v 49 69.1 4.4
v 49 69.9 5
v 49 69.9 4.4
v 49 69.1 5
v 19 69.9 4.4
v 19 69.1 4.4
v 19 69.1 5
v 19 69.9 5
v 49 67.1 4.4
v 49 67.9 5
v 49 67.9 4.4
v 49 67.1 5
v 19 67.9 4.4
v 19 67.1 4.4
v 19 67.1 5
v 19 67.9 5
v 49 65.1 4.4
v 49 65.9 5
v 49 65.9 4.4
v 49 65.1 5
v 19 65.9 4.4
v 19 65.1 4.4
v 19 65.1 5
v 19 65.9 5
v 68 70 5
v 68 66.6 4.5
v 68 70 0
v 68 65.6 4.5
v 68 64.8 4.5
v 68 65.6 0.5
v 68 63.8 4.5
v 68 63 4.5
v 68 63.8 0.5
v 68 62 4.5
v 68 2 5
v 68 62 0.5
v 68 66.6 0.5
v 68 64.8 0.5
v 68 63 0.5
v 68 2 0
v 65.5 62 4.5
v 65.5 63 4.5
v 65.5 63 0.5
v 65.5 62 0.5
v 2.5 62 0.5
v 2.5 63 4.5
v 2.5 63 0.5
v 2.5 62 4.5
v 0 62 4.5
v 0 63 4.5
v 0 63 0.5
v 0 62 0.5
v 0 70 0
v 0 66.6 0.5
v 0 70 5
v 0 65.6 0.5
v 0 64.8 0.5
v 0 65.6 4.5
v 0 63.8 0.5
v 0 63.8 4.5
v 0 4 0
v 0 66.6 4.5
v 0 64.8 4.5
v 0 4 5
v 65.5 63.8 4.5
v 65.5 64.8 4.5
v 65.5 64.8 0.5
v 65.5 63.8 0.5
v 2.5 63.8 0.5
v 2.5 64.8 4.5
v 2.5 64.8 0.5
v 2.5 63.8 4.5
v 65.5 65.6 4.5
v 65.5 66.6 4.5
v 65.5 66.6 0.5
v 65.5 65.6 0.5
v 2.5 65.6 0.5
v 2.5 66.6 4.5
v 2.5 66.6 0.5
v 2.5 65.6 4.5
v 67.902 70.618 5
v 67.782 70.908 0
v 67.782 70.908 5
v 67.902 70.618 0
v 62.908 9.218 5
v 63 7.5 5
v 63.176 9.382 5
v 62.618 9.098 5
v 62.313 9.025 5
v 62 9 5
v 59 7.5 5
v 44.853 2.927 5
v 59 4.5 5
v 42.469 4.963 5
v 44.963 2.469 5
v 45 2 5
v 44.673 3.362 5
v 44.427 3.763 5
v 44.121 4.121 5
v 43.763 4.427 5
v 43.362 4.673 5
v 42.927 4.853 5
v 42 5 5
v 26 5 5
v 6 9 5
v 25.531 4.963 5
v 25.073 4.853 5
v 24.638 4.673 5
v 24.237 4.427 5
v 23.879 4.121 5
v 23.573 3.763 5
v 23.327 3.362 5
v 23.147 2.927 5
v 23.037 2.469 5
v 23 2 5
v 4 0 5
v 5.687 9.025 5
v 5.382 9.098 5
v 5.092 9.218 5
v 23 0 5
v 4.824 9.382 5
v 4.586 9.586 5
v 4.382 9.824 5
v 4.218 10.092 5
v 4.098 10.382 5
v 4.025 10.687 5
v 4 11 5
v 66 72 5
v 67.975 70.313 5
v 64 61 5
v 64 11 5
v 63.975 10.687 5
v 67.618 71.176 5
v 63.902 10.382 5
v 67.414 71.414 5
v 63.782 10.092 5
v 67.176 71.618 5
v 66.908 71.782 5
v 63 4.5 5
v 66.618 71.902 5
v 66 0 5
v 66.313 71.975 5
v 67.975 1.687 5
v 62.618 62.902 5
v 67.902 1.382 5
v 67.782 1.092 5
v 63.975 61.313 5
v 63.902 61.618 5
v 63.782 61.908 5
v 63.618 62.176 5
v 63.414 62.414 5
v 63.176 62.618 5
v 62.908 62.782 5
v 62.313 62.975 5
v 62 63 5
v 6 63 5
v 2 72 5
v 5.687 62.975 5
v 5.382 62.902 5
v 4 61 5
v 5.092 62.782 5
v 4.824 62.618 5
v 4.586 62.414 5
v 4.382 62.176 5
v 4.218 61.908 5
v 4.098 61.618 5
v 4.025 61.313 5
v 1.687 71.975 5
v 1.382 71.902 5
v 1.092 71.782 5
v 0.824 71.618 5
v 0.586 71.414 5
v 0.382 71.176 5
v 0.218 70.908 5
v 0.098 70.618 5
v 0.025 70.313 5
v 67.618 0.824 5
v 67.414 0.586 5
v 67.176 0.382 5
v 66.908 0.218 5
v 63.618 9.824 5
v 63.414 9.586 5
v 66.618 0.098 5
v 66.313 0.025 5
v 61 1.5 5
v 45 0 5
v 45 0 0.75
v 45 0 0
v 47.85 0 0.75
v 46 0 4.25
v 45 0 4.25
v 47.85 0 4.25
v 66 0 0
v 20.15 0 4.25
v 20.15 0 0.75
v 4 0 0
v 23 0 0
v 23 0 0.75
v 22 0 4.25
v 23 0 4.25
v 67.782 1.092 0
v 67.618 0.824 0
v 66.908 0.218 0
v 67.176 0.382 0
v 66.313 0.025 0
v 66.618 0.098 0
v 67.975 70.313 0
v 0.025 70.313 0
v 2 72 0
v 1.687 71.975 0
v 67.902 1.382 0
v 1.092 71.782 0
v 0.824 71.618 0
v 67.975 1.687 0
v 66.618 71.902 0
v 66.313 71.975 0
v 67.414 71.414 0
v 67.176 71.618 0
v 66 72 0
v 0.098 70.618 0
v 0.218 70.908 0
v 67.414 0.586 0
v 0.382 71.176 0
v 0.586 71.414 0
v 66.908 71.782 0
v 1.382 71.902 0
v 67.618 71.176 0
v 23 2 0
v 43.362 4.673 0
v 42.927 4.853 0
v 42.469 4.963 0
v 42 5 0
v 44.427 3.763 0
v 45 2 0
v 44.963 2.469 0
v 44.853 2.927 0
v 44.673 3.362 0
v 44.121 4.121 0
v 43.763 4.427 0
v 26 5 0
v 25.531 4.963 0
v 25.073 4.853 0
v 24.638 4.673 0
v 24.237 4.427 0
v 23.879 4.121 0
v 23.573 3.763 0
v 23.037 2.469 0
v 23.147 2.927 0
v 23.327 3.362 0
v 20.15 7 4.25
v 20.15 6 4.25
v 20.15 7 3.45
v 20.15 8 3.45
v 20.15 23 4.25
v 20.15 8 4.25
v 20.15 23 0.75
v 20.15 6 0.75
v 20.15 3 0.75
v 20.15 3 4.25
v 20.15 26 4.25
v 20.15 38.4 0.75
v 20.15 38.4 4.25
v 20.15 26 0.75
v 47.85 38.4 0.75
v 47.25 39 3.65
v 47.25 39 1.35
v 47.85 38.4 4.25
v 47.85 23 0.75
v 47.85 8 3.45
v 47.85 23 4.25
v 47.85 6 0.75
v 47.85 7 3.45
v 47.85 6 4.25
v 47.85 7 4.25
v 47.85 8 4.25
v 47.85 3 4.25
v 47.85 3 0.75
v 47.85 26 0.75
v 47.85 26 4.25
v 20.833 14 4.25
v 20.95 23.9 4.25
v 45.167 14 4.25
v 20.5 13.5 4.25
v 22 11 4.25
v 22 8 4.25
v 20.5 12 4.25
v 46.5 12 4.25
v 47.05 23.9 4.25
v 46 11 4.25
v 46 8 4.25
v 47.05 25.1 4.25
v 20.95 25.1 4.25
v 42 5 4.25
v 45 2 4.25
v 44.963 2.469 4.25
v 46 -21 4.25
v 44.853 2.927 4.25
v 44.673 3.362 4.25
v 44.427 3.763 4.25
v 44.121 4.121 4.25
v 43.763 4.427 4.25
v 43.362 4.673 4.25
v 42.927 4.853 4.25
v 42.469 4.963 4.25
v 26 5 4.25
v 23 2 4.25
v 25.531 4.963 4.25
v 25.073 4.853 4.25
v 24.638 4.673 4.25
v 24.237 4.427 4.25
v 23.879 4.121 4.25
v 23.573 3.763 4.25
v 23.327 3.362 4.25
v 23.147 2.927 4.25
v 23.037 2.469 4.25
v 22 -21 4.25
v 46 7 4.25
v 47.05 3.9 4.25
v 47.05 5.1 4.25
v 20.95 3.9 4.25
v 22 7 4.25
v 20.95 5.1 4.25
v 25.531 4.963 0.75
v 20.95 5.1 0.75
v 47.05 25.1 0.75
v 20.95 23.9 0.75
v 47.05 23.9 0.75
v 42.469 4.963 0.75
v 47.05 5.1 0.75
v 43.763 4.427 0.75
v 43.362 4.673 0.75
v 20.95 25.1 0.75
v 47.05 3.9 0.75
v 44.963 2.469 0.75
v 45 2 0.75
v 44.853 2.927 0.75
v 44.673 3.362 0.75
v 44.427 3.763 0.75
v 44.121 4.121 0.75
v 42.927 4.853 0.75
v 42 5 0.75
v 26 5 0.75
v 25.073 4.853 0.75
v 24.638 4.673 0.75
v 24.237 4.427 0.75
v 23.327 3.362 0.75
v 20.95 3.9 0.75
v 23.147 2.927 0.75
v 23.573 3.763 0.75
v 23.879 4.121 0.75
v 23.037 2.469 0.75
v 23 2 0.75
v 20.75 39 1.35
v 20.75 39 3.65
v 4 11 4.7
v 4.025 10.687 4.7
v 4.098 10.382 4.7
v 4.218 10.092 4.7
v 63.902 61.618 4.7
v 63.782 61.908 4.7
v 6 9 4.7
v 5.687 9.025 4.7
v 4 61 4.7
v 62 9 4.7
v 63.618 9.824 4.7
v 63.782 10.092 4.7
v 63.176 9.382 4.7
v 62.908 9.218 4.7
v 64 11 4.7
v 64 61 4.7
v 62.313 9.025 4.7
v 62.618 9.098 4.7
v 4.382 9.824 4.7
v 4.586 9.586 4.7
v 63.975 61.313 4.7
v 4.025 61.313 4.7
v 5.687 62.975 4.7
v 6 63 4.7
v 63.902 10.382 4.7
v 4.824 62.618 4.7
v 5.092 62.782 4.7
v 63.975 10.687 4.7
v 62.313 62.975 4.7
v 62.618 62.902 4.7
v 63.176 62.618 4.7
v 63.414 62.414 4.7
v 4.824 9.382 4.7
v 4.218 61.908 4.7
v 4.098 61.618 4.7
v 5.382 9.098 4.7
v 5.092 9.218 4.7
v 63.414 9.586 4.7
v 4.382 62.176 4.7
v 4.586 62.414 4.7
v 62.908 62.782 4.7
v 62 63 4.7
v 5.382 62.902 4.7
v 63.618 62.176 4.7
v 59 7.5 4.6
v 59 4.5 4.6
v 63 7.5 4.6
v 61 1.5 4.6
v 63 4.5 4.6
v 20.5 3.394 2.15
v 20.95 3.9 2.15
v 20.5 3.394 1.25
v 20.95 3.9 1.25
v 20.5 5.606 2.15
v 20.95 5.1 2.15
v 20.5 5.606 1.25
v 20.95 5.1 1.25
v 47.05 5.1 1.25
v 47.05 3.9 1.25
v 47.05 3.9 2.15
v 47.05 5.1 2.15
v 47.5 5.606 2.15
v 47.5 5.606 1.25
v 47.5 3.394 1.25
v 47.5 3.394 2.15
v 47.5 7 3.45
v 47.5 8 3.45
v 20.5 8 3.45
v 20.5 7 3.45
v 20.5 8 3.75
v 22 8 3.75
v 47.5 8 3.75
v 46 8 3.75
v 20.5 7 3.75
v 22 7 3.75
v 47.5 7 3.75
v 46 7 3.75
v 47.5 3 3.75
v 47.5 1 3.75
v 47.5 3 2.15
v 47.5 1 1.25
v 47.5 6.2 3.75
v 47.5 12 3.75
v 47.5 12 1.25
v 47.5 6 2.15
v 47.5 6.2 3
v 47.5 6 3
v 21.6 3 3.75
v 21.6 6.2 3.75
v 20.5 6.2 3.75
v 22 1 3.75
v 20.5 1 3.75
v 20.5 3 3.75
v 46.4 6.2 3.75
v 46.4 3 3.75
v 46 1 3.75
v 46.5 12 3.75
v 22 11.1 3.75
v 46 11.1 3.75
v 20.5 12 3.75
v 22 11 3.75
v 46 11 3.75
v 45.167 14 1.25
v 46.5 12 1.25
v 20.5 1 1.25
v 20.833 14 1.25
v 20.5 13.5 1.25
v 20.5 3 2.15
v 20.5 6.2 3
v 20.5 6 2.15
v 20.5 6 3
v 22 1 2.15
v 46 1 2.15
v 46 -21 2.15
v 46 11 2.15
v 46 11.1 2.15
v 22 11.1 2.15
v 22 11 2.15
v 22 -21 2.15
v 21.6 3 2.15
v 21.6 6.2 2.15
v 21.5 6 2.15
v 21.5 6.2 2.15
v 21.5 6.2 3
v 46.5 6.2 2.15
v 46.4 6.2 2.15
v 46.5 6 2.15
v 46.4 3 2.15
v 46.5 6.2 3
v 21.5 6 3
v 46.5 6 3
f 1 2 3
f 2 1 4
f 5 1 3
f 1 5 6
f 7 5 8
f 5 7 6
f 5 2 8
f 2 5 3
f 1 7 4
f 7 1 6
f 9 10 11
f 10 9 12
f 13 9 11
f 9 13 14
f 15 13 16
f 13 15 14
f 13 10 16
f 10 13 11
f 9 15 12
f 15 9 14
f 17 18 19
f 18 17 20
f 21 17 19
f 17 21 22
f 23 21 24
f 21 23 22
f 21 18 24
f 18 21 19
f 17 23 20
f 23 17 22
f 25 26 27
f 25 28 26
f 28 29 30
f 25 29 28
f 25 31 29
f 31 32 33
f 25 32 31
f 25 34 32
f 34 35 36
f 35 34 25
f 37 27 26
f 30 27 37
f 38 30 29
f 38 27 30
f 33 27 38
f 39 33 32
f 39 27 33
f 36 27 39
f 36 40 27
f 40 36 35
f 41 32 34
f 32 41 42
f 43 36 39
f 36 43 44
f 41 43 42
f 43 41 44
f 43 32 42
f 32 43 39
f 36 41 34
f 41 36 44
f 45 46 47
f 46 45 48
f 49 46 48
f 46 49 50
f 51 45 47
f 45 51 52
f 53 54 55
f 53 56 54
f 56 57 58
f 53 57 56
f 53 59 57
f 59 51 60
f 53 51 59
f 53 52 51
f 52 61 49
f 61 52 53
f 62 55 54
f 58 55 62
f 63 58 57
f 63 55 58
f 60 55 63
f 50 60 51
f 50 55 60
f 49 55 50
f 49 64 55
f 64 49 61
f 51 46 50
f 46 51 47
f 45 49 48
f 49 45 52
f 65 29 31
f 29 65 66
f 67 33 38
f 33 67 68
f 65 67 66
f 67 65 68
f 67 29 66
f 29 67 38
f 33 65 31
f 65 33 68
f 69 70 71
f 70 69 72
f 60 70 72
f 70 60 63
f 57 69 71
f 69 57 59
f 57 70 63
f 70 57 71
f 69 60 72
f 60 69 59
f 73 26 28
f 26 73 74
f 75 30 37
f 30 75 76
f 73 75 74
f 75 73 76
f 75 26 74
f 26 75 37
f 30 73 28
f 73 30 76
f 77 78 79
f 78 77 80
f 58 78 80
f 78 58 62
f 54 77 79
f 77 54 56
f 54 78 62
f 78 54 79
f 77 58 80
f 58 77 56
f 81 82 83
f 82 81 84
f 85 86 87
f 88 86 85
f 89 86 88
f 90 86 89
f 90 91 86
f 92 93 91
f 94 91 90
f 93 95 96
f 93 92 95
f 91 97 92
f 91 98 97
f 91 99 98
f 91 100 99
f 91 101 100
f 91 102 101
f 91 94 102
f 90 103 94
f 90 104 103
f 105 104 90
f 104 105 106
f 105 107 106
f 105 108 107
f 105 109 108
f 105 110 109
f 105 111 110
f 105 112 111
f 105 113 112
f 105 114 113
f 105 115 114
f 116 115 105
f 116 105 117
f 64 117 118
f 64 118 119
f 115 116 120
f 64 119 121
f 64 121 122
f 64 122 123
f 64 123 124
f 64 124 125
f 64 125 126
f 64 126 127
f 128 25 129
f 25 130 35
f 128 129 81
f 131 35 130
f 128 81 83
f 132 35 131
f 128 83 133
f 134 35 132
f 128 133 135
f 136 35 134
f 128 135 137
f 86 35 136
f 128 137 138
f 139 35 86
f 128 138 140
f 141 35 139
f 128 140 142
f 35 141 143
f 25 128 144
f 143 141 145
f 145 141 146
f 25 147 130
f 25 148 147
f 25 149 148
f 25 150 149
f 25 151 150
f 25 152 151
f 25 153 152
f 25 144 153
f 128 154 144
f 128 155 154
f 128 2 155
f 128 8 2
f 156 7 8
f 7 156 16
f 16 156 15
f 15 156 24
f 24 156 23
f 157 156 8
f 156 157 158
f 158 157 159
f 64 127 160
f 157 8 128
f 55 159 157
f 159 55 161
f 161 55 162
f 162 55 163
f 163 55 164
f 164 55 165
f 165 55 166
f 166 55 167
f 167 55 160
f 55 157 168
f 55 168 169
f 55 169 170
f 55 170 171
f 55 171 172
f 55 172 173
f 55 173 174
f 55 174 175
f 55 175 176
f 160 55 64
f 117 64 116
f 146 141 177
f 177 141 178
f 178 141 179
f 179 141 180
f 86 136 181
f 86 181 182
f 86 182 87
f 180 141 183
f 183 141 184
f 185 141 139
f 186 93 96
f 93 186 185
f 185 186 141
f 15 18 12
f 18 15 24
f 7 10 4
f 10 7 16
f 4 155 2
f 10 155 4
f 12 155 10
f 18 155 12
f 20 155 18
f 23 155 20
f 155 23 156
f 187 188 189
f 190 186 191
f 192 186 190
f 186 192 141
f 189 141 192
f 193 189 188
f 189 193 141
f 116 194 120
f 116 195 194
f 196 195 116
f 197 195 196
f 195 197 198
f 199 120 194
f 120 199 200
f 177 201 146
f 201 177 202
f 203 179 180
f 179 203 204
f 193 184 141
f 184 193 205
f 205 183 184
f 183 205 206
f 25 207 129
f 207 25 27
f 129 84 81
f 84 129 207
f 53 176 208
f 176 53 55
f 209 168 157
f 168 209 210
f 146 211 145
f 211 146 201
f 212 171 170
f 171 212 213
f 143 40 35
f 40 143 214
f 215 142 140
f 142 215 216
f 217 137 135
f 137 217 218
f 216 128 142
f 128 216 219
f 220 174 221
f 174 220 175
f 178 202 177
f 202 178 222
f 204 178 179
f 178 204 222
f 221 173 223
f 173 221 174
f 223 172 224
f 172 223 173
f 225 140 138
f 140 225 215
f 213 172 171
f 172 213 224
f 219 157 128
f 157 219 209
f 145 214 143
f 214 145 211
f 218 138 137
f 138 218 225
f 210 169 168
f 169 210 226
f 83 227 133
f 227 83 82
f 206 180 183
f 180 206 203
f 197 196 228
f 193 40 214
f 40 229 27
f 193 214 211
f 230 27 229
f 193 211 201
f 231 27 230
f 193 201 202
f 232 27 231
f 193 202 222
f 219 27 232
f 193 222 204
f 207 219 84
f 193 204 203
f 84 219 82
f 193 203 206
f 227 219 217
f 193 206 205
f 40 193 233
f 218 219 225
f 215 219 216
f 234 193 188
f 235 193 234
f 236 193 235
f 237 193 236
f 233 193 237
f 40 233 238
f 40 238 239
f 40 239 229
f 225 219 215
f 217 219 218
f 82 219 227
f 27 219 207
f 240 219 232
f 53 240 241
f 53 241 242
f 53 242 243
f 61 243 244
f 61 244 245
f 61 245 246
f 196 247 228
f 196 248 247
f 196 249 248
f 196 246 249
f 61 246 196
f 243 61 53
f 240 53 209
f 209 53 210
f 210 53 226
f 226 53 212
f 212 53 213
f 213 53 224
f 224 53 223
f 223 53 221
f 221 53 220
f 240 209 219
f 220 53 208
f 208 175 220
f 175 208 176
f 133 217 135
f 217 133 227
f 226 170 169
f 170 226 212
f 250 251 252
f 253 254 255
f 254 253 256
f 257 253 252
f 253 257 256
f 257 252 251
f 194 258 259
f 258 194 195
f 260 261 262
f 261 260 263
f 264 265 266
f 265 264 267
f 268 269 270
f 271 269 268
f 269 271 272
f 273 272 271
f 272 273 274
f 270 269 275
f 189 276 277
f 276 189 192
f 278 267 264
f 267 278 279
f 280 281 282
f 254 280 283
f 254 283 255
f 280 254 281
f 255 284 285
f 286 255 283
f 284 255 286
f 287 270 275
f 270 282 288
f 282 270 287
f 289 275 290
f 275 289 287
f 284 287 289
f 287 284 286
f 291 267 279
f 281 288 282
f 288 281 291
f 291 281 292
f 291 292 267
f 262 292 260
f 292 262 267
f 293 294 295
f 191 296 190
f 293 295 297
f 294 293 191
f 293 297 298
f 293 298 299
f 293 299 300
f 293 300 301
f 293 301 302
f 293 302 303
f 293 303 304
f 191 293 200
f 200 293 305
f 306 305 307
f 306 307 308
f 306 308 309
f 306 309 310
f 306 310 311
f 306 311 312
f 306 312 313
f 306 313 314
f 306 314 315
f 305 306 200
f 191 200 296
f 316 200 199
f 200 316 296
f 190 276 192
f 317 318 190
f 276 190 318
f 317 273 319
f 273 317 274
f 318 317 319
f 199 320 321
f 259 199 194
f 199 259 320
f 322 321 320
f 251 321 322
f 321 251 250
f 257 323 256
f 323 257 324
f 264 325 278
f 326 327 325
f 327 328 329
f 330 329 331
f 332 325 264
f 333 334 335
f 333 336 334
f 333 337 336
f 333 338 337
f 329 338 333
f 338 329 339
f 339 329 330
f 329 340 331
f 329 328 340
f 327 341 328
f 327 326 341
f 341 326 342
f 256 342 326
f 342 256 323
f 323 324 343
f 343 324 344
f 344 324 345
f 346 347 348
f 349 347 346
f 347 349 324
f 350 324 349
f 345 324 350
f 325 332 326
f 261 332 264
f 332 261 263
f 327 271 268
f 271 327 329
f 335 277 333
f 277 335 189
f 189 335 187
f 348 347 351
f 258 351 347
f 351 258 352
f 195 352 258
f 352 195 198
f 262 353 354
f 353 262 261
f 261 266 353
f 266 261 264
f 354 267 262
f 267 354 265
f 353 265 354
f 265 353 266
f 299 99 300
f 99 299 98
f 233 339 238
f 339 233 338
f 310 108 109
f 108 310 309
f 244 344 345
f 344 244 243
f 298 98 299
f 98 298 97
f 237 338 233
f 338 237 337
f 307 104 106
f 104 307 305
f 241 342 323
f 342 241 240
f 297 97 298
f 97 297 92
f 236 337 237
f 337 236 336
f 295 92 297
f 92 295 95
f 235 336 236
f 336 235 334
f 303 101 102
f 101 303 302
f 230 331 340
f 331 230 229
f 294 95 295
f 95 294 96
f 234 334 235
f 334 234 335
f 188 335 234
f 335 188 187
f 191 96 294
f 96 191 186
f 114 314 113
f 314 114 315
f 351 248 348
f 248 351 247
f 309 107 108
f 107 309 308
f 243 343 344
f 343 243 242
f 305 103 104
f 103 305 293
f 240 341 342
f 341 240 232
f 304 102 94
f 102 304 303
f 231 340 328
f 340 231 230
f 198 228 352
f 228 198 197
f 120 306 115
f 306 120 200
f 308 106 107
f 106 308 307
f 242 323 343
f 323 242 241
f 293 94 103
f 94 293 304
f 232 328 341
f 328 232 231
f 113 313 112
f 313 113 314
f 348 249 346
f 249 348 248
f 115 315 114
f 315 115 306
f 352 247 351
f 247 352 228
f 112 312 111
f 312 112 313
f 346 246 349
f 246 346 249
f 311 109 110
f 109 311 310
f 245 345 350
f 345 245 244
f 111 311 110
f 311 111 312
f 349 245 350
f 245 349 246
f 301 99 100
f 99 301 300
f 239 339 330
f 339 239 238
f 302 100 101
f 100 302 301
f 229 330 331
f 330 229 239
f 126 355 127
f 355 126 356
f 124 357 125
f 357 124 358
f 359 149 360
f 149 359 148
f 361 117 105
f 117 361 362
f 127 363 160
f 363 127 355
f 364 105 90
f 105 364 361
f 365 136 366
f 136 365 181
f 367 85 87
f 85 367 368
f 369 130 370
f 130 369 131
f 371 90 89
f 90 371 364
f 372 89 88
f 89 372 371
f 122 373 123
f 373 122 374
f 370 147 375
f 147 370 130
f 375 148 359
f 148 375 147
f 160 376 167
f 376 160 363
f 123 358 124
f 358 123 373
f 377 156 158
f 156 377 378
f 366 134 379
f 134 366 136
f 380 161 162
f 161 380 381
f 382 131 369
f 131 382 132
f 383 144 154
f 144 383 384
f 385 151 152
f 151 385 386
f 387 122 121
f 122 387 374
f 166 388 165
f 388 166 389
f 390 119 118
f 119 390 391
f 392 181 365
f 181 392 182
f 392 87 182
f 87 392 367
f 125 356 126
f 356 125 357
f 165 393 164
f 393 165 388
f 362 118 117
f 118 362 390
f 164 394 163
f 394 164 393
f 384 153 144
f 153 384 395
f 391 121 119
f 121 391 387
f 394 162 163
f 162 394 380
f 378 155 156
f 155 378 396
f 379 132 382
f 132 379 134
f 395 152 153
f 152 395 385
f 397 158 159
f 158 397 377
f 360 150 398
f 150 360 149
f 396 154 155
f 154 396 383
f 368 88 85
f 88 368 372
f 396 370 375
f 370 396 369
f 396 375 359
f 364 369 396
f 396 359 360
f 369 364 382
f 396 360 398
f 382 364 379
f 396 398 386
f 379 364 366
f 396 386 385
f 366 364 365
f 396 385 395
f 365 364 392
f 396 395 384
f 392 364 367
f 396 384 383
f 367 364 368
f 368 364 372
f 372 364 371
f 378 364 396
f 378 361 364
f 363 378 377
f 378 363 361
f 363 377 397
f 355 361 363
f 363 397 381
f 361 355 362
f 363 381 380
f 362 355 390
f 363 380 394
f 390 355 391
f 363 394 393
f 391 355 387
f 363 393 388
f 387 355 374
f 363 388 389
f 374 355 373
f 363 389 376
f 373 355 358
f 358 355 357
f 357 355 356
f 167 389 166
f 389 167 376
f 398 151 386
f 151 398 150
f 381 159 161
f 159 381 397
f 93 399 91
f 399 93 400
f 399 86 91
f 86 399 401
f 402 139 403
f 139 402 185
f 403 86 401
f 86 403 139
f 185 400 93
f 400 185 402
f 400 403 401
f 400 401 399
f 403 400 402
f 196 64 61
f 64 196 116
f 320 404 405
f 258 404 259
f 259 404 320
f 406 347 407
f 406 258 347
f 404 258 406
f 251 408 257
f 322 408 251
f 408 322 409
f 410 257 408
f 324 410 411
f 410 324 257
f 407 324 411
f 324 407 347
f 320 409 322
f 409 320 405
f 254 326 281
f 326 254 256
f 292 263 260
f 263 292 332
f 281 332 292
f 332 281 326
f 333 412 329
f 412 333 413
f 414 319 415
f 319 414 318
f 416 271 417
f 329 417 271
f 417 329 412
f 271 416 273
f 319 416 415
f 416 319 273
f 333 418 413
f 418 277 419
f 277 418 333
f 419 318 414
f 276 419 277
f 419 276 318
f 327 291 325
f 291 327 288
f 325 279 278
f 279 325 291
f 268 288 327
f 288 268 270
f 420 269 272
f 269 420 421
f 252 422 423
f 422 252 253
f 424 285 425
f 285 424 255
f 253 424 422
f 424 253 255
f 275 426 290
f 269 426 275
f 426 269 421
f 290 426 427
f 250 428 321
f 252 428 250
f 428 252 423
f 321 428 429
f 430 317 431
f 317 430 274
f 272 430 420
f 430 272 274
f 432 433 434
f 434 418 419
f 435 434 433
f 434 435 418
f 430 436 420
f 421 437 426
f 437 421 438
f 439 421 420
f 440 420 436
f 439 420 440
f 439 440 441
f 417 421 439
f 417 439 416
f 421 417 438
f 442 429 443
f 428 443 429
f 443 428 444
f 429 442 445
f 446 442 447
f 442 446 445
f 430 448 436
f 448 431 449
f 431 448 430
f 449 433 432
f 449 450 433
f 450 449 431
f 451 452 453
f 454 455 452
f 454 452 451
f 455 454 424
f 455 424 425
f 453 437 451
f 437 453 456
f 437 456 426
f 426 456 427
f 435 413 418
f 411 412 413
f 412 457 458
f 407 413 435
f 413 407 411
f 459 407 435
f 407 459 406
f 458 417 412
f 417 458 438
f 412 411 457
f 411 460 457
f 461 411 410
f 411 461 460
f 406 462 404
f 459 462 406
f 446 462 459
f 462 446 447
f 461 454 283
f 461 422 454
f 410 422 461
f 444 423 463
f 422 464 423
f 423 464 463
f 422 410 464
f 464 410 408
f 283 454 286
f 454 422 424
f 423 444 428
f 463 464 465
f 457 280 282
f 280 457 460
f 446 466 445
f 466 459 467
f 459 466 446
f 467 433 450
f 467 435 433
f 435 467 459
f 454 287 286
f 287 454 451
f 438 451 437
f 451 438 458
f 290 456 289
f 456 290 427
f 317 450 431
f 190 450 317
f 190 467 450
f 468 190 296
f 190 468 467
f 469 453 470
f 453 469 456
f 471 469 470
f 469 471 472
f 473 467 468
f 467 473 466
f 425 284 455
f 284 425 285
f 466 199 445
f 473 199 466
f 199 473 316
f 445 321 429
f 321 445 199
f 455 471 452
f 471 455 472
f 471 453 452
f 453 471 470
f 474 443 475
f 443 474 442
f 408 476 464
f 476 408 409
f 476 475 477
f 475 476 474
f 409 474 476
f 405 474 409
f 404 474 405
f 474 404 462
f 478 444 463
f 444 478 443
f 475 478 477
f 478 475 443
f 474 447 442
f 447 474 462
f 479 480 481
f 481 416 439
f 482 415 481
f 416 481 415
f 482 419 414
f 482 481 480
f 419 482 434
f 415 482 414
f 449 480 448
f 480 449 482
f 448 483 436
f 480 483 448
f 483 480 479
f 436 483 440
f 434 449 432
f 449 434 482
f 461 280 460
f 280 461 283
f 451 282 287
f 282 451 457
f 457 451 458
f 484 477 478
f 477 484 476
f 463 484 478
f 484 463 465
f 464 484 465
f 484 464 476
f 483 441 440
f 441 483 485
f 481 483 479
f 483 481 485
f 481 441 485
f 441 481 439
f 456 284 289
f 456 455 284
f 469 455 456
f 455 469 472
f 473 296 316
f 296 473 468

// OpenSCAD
// OMD-C MiniDisc-style SD shell
// 1-piece outer shell, cantilevered captive slider

// Overall body dimensions
body_w          = 68;
body_h          = 72;
body_t          = 5;

// Corner radii
corner_r_outer = 2;
corner_r_inner = 2;

// Label recess
label_margin_x = 4;
label_margin_y = 9;
label_d        = 0.3;

// Top grips
grip_w       = 30;
grip_h       = 0.8;
grip_d       = 0.6;
grip_spacing = 1.2;
grip_count   = 3;

_grip_total_h = grip_count*grip_h + (grip_count-1)*grip_spacing;
_grip_top_margin = (label_margin_y - _grip_total_h) / 2;
grip_offset_y = _grip_top_margin + grip_h;

// Prusa Mini Mode (adds bridging slack and slight expansion)
prusa_mini_mode = true; 

// Clearances
slot_height_base = 3.3; // vertical clearance for slider + SD card (SD is ~2.1)
bridge_sag_allowance = prusa_mini_mode ? 0.2 : 0;
slot_height = slot_height_base + bridge_sag_allowance;

slot_clearance_base = 0.3; // horizontal clearance each side
slot_clearance = slot_clearance_base + (prusa_mini_mode ? 0.05 : 0);

// SD Card dimensions
sd_w = 24.0;
sd_l = 32.0;

// Slider dimensions
slider_grip_l = 10.0; // How much of the SD card is gripped by the slider pocket
slider_w = sd_w + 3.0; // 1.5mm walls on each side
slider_h = 13.0; // Total length of slider block (very compact)
slider_t = 2.5; // Thickness of the base of the slider
pocket_d = 1.6; // depth of the pocket in the slider for the SD card

// Cavity dimensions (Internal space in the shell)
cav_w = slider_w + 2*slot_clearance;
cav_t = slot_height;
cavity_x = (body_w - cav_w)/2;

// The cavity needs to be long enough to house the slider + the remaining length of the SD card when retracted.
// When retracted, the front of the slider is at y = 24, tip of SD card at y = 2.
cav_h = 42; 

// Latch / Locking mechanism
latch_depth_x = 0.8;
latch_height_z = slot_height;
latch_len_y = 3.0;

latch_1_y = 3.0;  // Position of latch that locks extended state
latch_2_y = 23.0; // Position of latch that locks retracted state

notch_depth_x = latch_depth_x + 0.3;
notch_height_z = 1.6;
notch_len_y = 3.2;

// Notch position on the slider (only one pair of notches needed now!)
notch_from_front = 2.0;


// ---------- helper: 2D rounded rectangle ----------
module rounded_rect_2d(w,h,r){
    r = min(r, min(w,h)/2);
    translate([r,r])
    minkowski(){
        square([w-2*r, h-2*r], center=false);
        circle(r=r, $fn=40);
    }
}

// ---------- helper: print-friendly ramp lip ----------
module printable_lip(depth, length, height) {
    polyhedron(
        points = [
            [0,0,0],                       // 0 bottom inside
            [depth,0,0],                   // 1 bottom outer
            [0,length,0],                  // 2 bottom inside front
            [depth,length,0],              // 3 bottom outer front

            [0,0,height],                  // 4 top inside
            [depth*0.2,0,height],          // 5 angled top
            [0,length,height],             // 6 top inside front
            [depth*0.2,length,height]      // 7 angled top front
        ],
        faces = [
            [0,1,3,2],    // bottom
            [0,2,6,4],    // inside wall
            [1,5,7,3],    // outside sloped wall
            [4,6,7,5],    // top
            [0,4,5,1],    // back
            [2,3,7,6]     // front
        ]
    );
}

// ---------- helper: double-sided latch ramp ----------
module shell_latch() {
    linear_extrude(height = cav_t)
        polygon([
            [0,0],
            [latch_depth_x, latch_len_y*0.3],
            [latch_depth_x, latch_len_y*0.7],
            [0, latch_len_y]
        ]);
}

// ---------- SHELL ----------
module miniDiscShell() {
    union() {
        difference() {
            // 1) OUTER BODY
            linear_extrude(height = body_t)
                rounded_rect_2d(body_w, body_h, corner_r_outer);

            // 2) INTERNAL TRAY CAVITY
            // Add a small chamfer on the opening edges to ease first insertion.
            slot_chamfer = 0.6;
            hull() {
                translate([
                    cavity_x + slot_chamfer,
                    -3,
                    (body_t - cav_t)/2 + slot_chamfer
                ])
                    cube([cav_w - 2*slot_chamfer, cav_h, cav_t - 2*slot_chamfer], center=false);
                translate([
                    cavity_x,
                    -3 - slot_chamfer,
                    (body_t - cav_t)/2
                ])
                    cube([cav_w, cav_h, cav_t], center=false);
            }

            // 2b) FINGER/THUMB CUTOUT in the bottom edge (top and bottom shell halves)
            // To allow grabbing the SD card / slider
            thumb_w = 22;
            thumb_h = 10;
            translate([(body_w - thumb_w)/2, -thumb_h/2, -1])
               linear_extrude(height=body_t+2)
                  rounded_rect_2d(thumb_w, thumb_h, 3);


            // 3) BIG LABEL RECESS
            label_w = body_w - 2*label_margin_x;
            label_h = body_h - 2*label_margin_y;
            translate([
                label_margin_x,
                label_margin_y,
                body_t - label_d
            ])
                linear_extrude(height = label_d + 0.1)
                    rounded_rect_2d(label_w, label_h, corner_r_inner);

            // 4) TOP GRIP GROOVES
            for (i = [0:grip_count-1]) {
                translate([
                    (body_w - grip_w)/2,
                    body_h - grip_offset_y - (i * (grip_h + grip_spacing)),
                    body_t - grip_d
                ])
                    cube([grip_w, grip_h, grip_d + 0.1], center=false);
            }

            // 5) SMALL ARROW ENGRAVED BOTTOM-RIGHT
            arrow_d = 0.4;
            arrow_w = 4;
            arrow_h = 6;
            translate([body_w-9, 4.5, body_t - arrow_d])
                linear_extrude(height = arrow_d + 0.1) {
                    union() {
                        square([arrow_w, arrow_h-3], center=false);
                        translate([arrow_w/2, 0, 0])
                            polygon([
                                [-arrow_w/2, 0],
                                [ arrow_w/2, 0],
                                [0, -(arrow_h-3)]
                            ]);
                    }
                }

            // 6) SIDE GRIP VENTS (both sides)
            side_grip_count   = 3;
            side_grip_w       = 1;   // along Y
            side_grip_h       = 4.0;   // along Z
            side_grip_gap     = 0.8;
            side_grip_x_depth = 2.5;   // into body (enough to cut fully)
            side_grip_y_offset = 62;    // up from bottom edge
            side_grip_z_offset = 0.5;  // up from underside

            for (i = [0:side_grip_count-1]) {
                // Right side
                translate([
                    body_w - side_grip_x_depth,
                    side_grip_y_offset + i*(side_grip_w + side_grip_gap),
                    side_grip_z_offset
                ])
                    cube([side_grip_x_depth, side_grip_w, side_grip_h], center=false);

                // Left side
                translate([
                    0,
                    side_grip_y_offset + i*(side_grip_w + side_grip_gap),
                    side_grip_z_offset
                ])
                    cube([side_grip_x_depth, side_grip_w, side_grip_h], center=false);
            }

             // 7) BOTTOM-LEFT DIAGONAL CUTOUT
            chamfer_size = 4;
            translate([0,0,-1])
                linear_extrude(height=body_t+2)
                    polygon(points=[
                        [-5, -5],
                        [chamfer_size, -5],
                        [chamfer_size, 0],
                        [0, chamfer_size],
                        [-5, chamfer_size]
                    ]);
        }

        // 7) SIDE LATCHES INSIDE SLOT
        // Left latches
        translate([cavity_x, latch_1_y, (body_t - cav_t)/2])
            shell_latch();
        translate([cavity_x, latch_2_y, (body_t - cav_t)/2])
            shell_latch();

        // Right latches
        translate([cavity_x + cav_w, latch_1_y, (body_t - cav_t)/2])
            mirror([1,0,0]) shell_latch();
        translate([cavity_x + cav_w, latch_2_y, (body_t - cav_t)/2])
            mirror([1,0,0]) shell_latch();
        
        // 8) FRONT STOP RIB ON ROOF
        // Prevents the slider from pulling entirely out of the shell
        front_stop_h = 0.8;
        translate([
            cavity_x,
            latch_1_y + latch_len_y + 1.0,
            (body_t + cav_t)/2 - front_stop_h
        ])
            cube([cav_w, 1.0, front_stop_h], center=false);
            
        // 9) REAR STOP RIB
        translate([
            cavity_x,
            cav_h - 1.5,
            (body_t - cav_t)/2
        ])
            cube([cav_w, 1.5, cav_t], center=false);
    }
}

// ---------- SLIDER ----------
module sdSlider() {
    difference() {
        union() {
            // Main slider body
            cube([slider_w, slider_h, slider_t], center=false);
            
            // Hook bump on the roof to catch the front stop rib
            // Total height must be < slot_height (3.3mm). slider_t is 2.5mm.
            // 2.5 + 0.6 = 3.1mm (0.2mm clearance under roof)
            translate([0, slider_h - 2.0, slider_t])
                cube([slider_w, 2.0, 0.6], center=false);
        }

        // SD card pocket 
        // We pocket the FRONT of the slider so the SD card sticks out towards y=0
        translate([
            (slider_w - sd_w)/2,
            -1,
            slider_t - pocket_d
        ])
            cube([sd_w, slider_grip_l + 1.1, pocket_d + 1], center=false);

        // Side notches for shell latches
        // Only one pair of notches needed on the slider now
        translate([0, notch_from_front, slider_t - notch_height_z])
            cube([notch_depth_x, notch_len_y, notch_height_z + 1], center=false);
        translate([slider_w - notch_depth_x, notch_from_front, slider_t - notch_height_z])
            cube([notch_depth_x, notch_len_y, notch_height_z + 1], center=false);
            
        // Add a slight taper to the REAR of the slider to help it guide into the shell on first insertion
        translate([-1, slider_h + 1, -1])
            linear_extrude(height=slider_t+2)
                polygon([
                    [0, -3],
                    [2, 0],
                    [slider_w - 2, 0],
                    [slider_w, -3],
                    [slider_w + 1, -3],
                    [slider_w + 1, 1],
                    [0, 1]
                ]);
    }

    // Internal retaining lips (print-friendly ramps) to hold SD card
    lip_depth  = 0.6; 
    lip_height = 0.8;
    lip_len    = 3.0;

    innerL = (slider_w - sd_w)/2;
    innerR = slider_w - innerL;
    
    lip_y_pos = 1.0;

    // Left lip
    translate([
        innerL,
        lip_y_pos,
        slider_t
    ])
        printable_lip(lip_depth, lip_len, lip_height);

    // Right lip 
    translate([
        innerR,
        lip_y_pos,
        slider_t
    ])
        mirror([1,0,0])
            printable_lip(lip_depth, lip_len, lip_height);

    // Friction bumps
    bump_w = 1.0;
    bump_l = 3.0;
    bump_h = 1.0;

    translate([0, slider_h/2 - bump_l/2, (slider_t - bump_h)/2])
        cube([bump_w, bump_l, bump_h], center = false);
    translate([slider_w - bump_w, slider_h/2 - bump_l/2, (slider_t - bump_h)/2])
        cube([bump_w, bump_l, bump_h], center = false);
}

// ===== PREVIEW / EXPORT =====

// miniDiscShell();
// translate([40, 0, 0])
//    sdSlider();

// Combined preview
miniDiscShell();

// Show in EXTENDED position (Comment out to hide)
translate([ cavity_x + slot_clearance, latch_1_y - notch_from_front, (body_t - slider_t)/2 ]) {
    color("red") sdSlider();
    // Mock SD Card
    translate([ (slider_w - sd_w)/2, slider_grip_l - sd_l, slider_t - pocket_d])
        color("blue") cube([sd_w, sd_l, 2.1]);
}

// Show in RETRACTED position
// translate([ cavity_x + slot_clearance, latch_2_y - notch_from_front, (body_t - slider_t)/2 ]) {
//     color("green") sdSlider();
//     // Mock SD Card
//     translate([ (slider_w - sd_w)/2, slider_grip_l - sd_l, slider_t - pocket_d])
//         color("purple") cube([sd_w, sd_l, 2.1]);
// }
